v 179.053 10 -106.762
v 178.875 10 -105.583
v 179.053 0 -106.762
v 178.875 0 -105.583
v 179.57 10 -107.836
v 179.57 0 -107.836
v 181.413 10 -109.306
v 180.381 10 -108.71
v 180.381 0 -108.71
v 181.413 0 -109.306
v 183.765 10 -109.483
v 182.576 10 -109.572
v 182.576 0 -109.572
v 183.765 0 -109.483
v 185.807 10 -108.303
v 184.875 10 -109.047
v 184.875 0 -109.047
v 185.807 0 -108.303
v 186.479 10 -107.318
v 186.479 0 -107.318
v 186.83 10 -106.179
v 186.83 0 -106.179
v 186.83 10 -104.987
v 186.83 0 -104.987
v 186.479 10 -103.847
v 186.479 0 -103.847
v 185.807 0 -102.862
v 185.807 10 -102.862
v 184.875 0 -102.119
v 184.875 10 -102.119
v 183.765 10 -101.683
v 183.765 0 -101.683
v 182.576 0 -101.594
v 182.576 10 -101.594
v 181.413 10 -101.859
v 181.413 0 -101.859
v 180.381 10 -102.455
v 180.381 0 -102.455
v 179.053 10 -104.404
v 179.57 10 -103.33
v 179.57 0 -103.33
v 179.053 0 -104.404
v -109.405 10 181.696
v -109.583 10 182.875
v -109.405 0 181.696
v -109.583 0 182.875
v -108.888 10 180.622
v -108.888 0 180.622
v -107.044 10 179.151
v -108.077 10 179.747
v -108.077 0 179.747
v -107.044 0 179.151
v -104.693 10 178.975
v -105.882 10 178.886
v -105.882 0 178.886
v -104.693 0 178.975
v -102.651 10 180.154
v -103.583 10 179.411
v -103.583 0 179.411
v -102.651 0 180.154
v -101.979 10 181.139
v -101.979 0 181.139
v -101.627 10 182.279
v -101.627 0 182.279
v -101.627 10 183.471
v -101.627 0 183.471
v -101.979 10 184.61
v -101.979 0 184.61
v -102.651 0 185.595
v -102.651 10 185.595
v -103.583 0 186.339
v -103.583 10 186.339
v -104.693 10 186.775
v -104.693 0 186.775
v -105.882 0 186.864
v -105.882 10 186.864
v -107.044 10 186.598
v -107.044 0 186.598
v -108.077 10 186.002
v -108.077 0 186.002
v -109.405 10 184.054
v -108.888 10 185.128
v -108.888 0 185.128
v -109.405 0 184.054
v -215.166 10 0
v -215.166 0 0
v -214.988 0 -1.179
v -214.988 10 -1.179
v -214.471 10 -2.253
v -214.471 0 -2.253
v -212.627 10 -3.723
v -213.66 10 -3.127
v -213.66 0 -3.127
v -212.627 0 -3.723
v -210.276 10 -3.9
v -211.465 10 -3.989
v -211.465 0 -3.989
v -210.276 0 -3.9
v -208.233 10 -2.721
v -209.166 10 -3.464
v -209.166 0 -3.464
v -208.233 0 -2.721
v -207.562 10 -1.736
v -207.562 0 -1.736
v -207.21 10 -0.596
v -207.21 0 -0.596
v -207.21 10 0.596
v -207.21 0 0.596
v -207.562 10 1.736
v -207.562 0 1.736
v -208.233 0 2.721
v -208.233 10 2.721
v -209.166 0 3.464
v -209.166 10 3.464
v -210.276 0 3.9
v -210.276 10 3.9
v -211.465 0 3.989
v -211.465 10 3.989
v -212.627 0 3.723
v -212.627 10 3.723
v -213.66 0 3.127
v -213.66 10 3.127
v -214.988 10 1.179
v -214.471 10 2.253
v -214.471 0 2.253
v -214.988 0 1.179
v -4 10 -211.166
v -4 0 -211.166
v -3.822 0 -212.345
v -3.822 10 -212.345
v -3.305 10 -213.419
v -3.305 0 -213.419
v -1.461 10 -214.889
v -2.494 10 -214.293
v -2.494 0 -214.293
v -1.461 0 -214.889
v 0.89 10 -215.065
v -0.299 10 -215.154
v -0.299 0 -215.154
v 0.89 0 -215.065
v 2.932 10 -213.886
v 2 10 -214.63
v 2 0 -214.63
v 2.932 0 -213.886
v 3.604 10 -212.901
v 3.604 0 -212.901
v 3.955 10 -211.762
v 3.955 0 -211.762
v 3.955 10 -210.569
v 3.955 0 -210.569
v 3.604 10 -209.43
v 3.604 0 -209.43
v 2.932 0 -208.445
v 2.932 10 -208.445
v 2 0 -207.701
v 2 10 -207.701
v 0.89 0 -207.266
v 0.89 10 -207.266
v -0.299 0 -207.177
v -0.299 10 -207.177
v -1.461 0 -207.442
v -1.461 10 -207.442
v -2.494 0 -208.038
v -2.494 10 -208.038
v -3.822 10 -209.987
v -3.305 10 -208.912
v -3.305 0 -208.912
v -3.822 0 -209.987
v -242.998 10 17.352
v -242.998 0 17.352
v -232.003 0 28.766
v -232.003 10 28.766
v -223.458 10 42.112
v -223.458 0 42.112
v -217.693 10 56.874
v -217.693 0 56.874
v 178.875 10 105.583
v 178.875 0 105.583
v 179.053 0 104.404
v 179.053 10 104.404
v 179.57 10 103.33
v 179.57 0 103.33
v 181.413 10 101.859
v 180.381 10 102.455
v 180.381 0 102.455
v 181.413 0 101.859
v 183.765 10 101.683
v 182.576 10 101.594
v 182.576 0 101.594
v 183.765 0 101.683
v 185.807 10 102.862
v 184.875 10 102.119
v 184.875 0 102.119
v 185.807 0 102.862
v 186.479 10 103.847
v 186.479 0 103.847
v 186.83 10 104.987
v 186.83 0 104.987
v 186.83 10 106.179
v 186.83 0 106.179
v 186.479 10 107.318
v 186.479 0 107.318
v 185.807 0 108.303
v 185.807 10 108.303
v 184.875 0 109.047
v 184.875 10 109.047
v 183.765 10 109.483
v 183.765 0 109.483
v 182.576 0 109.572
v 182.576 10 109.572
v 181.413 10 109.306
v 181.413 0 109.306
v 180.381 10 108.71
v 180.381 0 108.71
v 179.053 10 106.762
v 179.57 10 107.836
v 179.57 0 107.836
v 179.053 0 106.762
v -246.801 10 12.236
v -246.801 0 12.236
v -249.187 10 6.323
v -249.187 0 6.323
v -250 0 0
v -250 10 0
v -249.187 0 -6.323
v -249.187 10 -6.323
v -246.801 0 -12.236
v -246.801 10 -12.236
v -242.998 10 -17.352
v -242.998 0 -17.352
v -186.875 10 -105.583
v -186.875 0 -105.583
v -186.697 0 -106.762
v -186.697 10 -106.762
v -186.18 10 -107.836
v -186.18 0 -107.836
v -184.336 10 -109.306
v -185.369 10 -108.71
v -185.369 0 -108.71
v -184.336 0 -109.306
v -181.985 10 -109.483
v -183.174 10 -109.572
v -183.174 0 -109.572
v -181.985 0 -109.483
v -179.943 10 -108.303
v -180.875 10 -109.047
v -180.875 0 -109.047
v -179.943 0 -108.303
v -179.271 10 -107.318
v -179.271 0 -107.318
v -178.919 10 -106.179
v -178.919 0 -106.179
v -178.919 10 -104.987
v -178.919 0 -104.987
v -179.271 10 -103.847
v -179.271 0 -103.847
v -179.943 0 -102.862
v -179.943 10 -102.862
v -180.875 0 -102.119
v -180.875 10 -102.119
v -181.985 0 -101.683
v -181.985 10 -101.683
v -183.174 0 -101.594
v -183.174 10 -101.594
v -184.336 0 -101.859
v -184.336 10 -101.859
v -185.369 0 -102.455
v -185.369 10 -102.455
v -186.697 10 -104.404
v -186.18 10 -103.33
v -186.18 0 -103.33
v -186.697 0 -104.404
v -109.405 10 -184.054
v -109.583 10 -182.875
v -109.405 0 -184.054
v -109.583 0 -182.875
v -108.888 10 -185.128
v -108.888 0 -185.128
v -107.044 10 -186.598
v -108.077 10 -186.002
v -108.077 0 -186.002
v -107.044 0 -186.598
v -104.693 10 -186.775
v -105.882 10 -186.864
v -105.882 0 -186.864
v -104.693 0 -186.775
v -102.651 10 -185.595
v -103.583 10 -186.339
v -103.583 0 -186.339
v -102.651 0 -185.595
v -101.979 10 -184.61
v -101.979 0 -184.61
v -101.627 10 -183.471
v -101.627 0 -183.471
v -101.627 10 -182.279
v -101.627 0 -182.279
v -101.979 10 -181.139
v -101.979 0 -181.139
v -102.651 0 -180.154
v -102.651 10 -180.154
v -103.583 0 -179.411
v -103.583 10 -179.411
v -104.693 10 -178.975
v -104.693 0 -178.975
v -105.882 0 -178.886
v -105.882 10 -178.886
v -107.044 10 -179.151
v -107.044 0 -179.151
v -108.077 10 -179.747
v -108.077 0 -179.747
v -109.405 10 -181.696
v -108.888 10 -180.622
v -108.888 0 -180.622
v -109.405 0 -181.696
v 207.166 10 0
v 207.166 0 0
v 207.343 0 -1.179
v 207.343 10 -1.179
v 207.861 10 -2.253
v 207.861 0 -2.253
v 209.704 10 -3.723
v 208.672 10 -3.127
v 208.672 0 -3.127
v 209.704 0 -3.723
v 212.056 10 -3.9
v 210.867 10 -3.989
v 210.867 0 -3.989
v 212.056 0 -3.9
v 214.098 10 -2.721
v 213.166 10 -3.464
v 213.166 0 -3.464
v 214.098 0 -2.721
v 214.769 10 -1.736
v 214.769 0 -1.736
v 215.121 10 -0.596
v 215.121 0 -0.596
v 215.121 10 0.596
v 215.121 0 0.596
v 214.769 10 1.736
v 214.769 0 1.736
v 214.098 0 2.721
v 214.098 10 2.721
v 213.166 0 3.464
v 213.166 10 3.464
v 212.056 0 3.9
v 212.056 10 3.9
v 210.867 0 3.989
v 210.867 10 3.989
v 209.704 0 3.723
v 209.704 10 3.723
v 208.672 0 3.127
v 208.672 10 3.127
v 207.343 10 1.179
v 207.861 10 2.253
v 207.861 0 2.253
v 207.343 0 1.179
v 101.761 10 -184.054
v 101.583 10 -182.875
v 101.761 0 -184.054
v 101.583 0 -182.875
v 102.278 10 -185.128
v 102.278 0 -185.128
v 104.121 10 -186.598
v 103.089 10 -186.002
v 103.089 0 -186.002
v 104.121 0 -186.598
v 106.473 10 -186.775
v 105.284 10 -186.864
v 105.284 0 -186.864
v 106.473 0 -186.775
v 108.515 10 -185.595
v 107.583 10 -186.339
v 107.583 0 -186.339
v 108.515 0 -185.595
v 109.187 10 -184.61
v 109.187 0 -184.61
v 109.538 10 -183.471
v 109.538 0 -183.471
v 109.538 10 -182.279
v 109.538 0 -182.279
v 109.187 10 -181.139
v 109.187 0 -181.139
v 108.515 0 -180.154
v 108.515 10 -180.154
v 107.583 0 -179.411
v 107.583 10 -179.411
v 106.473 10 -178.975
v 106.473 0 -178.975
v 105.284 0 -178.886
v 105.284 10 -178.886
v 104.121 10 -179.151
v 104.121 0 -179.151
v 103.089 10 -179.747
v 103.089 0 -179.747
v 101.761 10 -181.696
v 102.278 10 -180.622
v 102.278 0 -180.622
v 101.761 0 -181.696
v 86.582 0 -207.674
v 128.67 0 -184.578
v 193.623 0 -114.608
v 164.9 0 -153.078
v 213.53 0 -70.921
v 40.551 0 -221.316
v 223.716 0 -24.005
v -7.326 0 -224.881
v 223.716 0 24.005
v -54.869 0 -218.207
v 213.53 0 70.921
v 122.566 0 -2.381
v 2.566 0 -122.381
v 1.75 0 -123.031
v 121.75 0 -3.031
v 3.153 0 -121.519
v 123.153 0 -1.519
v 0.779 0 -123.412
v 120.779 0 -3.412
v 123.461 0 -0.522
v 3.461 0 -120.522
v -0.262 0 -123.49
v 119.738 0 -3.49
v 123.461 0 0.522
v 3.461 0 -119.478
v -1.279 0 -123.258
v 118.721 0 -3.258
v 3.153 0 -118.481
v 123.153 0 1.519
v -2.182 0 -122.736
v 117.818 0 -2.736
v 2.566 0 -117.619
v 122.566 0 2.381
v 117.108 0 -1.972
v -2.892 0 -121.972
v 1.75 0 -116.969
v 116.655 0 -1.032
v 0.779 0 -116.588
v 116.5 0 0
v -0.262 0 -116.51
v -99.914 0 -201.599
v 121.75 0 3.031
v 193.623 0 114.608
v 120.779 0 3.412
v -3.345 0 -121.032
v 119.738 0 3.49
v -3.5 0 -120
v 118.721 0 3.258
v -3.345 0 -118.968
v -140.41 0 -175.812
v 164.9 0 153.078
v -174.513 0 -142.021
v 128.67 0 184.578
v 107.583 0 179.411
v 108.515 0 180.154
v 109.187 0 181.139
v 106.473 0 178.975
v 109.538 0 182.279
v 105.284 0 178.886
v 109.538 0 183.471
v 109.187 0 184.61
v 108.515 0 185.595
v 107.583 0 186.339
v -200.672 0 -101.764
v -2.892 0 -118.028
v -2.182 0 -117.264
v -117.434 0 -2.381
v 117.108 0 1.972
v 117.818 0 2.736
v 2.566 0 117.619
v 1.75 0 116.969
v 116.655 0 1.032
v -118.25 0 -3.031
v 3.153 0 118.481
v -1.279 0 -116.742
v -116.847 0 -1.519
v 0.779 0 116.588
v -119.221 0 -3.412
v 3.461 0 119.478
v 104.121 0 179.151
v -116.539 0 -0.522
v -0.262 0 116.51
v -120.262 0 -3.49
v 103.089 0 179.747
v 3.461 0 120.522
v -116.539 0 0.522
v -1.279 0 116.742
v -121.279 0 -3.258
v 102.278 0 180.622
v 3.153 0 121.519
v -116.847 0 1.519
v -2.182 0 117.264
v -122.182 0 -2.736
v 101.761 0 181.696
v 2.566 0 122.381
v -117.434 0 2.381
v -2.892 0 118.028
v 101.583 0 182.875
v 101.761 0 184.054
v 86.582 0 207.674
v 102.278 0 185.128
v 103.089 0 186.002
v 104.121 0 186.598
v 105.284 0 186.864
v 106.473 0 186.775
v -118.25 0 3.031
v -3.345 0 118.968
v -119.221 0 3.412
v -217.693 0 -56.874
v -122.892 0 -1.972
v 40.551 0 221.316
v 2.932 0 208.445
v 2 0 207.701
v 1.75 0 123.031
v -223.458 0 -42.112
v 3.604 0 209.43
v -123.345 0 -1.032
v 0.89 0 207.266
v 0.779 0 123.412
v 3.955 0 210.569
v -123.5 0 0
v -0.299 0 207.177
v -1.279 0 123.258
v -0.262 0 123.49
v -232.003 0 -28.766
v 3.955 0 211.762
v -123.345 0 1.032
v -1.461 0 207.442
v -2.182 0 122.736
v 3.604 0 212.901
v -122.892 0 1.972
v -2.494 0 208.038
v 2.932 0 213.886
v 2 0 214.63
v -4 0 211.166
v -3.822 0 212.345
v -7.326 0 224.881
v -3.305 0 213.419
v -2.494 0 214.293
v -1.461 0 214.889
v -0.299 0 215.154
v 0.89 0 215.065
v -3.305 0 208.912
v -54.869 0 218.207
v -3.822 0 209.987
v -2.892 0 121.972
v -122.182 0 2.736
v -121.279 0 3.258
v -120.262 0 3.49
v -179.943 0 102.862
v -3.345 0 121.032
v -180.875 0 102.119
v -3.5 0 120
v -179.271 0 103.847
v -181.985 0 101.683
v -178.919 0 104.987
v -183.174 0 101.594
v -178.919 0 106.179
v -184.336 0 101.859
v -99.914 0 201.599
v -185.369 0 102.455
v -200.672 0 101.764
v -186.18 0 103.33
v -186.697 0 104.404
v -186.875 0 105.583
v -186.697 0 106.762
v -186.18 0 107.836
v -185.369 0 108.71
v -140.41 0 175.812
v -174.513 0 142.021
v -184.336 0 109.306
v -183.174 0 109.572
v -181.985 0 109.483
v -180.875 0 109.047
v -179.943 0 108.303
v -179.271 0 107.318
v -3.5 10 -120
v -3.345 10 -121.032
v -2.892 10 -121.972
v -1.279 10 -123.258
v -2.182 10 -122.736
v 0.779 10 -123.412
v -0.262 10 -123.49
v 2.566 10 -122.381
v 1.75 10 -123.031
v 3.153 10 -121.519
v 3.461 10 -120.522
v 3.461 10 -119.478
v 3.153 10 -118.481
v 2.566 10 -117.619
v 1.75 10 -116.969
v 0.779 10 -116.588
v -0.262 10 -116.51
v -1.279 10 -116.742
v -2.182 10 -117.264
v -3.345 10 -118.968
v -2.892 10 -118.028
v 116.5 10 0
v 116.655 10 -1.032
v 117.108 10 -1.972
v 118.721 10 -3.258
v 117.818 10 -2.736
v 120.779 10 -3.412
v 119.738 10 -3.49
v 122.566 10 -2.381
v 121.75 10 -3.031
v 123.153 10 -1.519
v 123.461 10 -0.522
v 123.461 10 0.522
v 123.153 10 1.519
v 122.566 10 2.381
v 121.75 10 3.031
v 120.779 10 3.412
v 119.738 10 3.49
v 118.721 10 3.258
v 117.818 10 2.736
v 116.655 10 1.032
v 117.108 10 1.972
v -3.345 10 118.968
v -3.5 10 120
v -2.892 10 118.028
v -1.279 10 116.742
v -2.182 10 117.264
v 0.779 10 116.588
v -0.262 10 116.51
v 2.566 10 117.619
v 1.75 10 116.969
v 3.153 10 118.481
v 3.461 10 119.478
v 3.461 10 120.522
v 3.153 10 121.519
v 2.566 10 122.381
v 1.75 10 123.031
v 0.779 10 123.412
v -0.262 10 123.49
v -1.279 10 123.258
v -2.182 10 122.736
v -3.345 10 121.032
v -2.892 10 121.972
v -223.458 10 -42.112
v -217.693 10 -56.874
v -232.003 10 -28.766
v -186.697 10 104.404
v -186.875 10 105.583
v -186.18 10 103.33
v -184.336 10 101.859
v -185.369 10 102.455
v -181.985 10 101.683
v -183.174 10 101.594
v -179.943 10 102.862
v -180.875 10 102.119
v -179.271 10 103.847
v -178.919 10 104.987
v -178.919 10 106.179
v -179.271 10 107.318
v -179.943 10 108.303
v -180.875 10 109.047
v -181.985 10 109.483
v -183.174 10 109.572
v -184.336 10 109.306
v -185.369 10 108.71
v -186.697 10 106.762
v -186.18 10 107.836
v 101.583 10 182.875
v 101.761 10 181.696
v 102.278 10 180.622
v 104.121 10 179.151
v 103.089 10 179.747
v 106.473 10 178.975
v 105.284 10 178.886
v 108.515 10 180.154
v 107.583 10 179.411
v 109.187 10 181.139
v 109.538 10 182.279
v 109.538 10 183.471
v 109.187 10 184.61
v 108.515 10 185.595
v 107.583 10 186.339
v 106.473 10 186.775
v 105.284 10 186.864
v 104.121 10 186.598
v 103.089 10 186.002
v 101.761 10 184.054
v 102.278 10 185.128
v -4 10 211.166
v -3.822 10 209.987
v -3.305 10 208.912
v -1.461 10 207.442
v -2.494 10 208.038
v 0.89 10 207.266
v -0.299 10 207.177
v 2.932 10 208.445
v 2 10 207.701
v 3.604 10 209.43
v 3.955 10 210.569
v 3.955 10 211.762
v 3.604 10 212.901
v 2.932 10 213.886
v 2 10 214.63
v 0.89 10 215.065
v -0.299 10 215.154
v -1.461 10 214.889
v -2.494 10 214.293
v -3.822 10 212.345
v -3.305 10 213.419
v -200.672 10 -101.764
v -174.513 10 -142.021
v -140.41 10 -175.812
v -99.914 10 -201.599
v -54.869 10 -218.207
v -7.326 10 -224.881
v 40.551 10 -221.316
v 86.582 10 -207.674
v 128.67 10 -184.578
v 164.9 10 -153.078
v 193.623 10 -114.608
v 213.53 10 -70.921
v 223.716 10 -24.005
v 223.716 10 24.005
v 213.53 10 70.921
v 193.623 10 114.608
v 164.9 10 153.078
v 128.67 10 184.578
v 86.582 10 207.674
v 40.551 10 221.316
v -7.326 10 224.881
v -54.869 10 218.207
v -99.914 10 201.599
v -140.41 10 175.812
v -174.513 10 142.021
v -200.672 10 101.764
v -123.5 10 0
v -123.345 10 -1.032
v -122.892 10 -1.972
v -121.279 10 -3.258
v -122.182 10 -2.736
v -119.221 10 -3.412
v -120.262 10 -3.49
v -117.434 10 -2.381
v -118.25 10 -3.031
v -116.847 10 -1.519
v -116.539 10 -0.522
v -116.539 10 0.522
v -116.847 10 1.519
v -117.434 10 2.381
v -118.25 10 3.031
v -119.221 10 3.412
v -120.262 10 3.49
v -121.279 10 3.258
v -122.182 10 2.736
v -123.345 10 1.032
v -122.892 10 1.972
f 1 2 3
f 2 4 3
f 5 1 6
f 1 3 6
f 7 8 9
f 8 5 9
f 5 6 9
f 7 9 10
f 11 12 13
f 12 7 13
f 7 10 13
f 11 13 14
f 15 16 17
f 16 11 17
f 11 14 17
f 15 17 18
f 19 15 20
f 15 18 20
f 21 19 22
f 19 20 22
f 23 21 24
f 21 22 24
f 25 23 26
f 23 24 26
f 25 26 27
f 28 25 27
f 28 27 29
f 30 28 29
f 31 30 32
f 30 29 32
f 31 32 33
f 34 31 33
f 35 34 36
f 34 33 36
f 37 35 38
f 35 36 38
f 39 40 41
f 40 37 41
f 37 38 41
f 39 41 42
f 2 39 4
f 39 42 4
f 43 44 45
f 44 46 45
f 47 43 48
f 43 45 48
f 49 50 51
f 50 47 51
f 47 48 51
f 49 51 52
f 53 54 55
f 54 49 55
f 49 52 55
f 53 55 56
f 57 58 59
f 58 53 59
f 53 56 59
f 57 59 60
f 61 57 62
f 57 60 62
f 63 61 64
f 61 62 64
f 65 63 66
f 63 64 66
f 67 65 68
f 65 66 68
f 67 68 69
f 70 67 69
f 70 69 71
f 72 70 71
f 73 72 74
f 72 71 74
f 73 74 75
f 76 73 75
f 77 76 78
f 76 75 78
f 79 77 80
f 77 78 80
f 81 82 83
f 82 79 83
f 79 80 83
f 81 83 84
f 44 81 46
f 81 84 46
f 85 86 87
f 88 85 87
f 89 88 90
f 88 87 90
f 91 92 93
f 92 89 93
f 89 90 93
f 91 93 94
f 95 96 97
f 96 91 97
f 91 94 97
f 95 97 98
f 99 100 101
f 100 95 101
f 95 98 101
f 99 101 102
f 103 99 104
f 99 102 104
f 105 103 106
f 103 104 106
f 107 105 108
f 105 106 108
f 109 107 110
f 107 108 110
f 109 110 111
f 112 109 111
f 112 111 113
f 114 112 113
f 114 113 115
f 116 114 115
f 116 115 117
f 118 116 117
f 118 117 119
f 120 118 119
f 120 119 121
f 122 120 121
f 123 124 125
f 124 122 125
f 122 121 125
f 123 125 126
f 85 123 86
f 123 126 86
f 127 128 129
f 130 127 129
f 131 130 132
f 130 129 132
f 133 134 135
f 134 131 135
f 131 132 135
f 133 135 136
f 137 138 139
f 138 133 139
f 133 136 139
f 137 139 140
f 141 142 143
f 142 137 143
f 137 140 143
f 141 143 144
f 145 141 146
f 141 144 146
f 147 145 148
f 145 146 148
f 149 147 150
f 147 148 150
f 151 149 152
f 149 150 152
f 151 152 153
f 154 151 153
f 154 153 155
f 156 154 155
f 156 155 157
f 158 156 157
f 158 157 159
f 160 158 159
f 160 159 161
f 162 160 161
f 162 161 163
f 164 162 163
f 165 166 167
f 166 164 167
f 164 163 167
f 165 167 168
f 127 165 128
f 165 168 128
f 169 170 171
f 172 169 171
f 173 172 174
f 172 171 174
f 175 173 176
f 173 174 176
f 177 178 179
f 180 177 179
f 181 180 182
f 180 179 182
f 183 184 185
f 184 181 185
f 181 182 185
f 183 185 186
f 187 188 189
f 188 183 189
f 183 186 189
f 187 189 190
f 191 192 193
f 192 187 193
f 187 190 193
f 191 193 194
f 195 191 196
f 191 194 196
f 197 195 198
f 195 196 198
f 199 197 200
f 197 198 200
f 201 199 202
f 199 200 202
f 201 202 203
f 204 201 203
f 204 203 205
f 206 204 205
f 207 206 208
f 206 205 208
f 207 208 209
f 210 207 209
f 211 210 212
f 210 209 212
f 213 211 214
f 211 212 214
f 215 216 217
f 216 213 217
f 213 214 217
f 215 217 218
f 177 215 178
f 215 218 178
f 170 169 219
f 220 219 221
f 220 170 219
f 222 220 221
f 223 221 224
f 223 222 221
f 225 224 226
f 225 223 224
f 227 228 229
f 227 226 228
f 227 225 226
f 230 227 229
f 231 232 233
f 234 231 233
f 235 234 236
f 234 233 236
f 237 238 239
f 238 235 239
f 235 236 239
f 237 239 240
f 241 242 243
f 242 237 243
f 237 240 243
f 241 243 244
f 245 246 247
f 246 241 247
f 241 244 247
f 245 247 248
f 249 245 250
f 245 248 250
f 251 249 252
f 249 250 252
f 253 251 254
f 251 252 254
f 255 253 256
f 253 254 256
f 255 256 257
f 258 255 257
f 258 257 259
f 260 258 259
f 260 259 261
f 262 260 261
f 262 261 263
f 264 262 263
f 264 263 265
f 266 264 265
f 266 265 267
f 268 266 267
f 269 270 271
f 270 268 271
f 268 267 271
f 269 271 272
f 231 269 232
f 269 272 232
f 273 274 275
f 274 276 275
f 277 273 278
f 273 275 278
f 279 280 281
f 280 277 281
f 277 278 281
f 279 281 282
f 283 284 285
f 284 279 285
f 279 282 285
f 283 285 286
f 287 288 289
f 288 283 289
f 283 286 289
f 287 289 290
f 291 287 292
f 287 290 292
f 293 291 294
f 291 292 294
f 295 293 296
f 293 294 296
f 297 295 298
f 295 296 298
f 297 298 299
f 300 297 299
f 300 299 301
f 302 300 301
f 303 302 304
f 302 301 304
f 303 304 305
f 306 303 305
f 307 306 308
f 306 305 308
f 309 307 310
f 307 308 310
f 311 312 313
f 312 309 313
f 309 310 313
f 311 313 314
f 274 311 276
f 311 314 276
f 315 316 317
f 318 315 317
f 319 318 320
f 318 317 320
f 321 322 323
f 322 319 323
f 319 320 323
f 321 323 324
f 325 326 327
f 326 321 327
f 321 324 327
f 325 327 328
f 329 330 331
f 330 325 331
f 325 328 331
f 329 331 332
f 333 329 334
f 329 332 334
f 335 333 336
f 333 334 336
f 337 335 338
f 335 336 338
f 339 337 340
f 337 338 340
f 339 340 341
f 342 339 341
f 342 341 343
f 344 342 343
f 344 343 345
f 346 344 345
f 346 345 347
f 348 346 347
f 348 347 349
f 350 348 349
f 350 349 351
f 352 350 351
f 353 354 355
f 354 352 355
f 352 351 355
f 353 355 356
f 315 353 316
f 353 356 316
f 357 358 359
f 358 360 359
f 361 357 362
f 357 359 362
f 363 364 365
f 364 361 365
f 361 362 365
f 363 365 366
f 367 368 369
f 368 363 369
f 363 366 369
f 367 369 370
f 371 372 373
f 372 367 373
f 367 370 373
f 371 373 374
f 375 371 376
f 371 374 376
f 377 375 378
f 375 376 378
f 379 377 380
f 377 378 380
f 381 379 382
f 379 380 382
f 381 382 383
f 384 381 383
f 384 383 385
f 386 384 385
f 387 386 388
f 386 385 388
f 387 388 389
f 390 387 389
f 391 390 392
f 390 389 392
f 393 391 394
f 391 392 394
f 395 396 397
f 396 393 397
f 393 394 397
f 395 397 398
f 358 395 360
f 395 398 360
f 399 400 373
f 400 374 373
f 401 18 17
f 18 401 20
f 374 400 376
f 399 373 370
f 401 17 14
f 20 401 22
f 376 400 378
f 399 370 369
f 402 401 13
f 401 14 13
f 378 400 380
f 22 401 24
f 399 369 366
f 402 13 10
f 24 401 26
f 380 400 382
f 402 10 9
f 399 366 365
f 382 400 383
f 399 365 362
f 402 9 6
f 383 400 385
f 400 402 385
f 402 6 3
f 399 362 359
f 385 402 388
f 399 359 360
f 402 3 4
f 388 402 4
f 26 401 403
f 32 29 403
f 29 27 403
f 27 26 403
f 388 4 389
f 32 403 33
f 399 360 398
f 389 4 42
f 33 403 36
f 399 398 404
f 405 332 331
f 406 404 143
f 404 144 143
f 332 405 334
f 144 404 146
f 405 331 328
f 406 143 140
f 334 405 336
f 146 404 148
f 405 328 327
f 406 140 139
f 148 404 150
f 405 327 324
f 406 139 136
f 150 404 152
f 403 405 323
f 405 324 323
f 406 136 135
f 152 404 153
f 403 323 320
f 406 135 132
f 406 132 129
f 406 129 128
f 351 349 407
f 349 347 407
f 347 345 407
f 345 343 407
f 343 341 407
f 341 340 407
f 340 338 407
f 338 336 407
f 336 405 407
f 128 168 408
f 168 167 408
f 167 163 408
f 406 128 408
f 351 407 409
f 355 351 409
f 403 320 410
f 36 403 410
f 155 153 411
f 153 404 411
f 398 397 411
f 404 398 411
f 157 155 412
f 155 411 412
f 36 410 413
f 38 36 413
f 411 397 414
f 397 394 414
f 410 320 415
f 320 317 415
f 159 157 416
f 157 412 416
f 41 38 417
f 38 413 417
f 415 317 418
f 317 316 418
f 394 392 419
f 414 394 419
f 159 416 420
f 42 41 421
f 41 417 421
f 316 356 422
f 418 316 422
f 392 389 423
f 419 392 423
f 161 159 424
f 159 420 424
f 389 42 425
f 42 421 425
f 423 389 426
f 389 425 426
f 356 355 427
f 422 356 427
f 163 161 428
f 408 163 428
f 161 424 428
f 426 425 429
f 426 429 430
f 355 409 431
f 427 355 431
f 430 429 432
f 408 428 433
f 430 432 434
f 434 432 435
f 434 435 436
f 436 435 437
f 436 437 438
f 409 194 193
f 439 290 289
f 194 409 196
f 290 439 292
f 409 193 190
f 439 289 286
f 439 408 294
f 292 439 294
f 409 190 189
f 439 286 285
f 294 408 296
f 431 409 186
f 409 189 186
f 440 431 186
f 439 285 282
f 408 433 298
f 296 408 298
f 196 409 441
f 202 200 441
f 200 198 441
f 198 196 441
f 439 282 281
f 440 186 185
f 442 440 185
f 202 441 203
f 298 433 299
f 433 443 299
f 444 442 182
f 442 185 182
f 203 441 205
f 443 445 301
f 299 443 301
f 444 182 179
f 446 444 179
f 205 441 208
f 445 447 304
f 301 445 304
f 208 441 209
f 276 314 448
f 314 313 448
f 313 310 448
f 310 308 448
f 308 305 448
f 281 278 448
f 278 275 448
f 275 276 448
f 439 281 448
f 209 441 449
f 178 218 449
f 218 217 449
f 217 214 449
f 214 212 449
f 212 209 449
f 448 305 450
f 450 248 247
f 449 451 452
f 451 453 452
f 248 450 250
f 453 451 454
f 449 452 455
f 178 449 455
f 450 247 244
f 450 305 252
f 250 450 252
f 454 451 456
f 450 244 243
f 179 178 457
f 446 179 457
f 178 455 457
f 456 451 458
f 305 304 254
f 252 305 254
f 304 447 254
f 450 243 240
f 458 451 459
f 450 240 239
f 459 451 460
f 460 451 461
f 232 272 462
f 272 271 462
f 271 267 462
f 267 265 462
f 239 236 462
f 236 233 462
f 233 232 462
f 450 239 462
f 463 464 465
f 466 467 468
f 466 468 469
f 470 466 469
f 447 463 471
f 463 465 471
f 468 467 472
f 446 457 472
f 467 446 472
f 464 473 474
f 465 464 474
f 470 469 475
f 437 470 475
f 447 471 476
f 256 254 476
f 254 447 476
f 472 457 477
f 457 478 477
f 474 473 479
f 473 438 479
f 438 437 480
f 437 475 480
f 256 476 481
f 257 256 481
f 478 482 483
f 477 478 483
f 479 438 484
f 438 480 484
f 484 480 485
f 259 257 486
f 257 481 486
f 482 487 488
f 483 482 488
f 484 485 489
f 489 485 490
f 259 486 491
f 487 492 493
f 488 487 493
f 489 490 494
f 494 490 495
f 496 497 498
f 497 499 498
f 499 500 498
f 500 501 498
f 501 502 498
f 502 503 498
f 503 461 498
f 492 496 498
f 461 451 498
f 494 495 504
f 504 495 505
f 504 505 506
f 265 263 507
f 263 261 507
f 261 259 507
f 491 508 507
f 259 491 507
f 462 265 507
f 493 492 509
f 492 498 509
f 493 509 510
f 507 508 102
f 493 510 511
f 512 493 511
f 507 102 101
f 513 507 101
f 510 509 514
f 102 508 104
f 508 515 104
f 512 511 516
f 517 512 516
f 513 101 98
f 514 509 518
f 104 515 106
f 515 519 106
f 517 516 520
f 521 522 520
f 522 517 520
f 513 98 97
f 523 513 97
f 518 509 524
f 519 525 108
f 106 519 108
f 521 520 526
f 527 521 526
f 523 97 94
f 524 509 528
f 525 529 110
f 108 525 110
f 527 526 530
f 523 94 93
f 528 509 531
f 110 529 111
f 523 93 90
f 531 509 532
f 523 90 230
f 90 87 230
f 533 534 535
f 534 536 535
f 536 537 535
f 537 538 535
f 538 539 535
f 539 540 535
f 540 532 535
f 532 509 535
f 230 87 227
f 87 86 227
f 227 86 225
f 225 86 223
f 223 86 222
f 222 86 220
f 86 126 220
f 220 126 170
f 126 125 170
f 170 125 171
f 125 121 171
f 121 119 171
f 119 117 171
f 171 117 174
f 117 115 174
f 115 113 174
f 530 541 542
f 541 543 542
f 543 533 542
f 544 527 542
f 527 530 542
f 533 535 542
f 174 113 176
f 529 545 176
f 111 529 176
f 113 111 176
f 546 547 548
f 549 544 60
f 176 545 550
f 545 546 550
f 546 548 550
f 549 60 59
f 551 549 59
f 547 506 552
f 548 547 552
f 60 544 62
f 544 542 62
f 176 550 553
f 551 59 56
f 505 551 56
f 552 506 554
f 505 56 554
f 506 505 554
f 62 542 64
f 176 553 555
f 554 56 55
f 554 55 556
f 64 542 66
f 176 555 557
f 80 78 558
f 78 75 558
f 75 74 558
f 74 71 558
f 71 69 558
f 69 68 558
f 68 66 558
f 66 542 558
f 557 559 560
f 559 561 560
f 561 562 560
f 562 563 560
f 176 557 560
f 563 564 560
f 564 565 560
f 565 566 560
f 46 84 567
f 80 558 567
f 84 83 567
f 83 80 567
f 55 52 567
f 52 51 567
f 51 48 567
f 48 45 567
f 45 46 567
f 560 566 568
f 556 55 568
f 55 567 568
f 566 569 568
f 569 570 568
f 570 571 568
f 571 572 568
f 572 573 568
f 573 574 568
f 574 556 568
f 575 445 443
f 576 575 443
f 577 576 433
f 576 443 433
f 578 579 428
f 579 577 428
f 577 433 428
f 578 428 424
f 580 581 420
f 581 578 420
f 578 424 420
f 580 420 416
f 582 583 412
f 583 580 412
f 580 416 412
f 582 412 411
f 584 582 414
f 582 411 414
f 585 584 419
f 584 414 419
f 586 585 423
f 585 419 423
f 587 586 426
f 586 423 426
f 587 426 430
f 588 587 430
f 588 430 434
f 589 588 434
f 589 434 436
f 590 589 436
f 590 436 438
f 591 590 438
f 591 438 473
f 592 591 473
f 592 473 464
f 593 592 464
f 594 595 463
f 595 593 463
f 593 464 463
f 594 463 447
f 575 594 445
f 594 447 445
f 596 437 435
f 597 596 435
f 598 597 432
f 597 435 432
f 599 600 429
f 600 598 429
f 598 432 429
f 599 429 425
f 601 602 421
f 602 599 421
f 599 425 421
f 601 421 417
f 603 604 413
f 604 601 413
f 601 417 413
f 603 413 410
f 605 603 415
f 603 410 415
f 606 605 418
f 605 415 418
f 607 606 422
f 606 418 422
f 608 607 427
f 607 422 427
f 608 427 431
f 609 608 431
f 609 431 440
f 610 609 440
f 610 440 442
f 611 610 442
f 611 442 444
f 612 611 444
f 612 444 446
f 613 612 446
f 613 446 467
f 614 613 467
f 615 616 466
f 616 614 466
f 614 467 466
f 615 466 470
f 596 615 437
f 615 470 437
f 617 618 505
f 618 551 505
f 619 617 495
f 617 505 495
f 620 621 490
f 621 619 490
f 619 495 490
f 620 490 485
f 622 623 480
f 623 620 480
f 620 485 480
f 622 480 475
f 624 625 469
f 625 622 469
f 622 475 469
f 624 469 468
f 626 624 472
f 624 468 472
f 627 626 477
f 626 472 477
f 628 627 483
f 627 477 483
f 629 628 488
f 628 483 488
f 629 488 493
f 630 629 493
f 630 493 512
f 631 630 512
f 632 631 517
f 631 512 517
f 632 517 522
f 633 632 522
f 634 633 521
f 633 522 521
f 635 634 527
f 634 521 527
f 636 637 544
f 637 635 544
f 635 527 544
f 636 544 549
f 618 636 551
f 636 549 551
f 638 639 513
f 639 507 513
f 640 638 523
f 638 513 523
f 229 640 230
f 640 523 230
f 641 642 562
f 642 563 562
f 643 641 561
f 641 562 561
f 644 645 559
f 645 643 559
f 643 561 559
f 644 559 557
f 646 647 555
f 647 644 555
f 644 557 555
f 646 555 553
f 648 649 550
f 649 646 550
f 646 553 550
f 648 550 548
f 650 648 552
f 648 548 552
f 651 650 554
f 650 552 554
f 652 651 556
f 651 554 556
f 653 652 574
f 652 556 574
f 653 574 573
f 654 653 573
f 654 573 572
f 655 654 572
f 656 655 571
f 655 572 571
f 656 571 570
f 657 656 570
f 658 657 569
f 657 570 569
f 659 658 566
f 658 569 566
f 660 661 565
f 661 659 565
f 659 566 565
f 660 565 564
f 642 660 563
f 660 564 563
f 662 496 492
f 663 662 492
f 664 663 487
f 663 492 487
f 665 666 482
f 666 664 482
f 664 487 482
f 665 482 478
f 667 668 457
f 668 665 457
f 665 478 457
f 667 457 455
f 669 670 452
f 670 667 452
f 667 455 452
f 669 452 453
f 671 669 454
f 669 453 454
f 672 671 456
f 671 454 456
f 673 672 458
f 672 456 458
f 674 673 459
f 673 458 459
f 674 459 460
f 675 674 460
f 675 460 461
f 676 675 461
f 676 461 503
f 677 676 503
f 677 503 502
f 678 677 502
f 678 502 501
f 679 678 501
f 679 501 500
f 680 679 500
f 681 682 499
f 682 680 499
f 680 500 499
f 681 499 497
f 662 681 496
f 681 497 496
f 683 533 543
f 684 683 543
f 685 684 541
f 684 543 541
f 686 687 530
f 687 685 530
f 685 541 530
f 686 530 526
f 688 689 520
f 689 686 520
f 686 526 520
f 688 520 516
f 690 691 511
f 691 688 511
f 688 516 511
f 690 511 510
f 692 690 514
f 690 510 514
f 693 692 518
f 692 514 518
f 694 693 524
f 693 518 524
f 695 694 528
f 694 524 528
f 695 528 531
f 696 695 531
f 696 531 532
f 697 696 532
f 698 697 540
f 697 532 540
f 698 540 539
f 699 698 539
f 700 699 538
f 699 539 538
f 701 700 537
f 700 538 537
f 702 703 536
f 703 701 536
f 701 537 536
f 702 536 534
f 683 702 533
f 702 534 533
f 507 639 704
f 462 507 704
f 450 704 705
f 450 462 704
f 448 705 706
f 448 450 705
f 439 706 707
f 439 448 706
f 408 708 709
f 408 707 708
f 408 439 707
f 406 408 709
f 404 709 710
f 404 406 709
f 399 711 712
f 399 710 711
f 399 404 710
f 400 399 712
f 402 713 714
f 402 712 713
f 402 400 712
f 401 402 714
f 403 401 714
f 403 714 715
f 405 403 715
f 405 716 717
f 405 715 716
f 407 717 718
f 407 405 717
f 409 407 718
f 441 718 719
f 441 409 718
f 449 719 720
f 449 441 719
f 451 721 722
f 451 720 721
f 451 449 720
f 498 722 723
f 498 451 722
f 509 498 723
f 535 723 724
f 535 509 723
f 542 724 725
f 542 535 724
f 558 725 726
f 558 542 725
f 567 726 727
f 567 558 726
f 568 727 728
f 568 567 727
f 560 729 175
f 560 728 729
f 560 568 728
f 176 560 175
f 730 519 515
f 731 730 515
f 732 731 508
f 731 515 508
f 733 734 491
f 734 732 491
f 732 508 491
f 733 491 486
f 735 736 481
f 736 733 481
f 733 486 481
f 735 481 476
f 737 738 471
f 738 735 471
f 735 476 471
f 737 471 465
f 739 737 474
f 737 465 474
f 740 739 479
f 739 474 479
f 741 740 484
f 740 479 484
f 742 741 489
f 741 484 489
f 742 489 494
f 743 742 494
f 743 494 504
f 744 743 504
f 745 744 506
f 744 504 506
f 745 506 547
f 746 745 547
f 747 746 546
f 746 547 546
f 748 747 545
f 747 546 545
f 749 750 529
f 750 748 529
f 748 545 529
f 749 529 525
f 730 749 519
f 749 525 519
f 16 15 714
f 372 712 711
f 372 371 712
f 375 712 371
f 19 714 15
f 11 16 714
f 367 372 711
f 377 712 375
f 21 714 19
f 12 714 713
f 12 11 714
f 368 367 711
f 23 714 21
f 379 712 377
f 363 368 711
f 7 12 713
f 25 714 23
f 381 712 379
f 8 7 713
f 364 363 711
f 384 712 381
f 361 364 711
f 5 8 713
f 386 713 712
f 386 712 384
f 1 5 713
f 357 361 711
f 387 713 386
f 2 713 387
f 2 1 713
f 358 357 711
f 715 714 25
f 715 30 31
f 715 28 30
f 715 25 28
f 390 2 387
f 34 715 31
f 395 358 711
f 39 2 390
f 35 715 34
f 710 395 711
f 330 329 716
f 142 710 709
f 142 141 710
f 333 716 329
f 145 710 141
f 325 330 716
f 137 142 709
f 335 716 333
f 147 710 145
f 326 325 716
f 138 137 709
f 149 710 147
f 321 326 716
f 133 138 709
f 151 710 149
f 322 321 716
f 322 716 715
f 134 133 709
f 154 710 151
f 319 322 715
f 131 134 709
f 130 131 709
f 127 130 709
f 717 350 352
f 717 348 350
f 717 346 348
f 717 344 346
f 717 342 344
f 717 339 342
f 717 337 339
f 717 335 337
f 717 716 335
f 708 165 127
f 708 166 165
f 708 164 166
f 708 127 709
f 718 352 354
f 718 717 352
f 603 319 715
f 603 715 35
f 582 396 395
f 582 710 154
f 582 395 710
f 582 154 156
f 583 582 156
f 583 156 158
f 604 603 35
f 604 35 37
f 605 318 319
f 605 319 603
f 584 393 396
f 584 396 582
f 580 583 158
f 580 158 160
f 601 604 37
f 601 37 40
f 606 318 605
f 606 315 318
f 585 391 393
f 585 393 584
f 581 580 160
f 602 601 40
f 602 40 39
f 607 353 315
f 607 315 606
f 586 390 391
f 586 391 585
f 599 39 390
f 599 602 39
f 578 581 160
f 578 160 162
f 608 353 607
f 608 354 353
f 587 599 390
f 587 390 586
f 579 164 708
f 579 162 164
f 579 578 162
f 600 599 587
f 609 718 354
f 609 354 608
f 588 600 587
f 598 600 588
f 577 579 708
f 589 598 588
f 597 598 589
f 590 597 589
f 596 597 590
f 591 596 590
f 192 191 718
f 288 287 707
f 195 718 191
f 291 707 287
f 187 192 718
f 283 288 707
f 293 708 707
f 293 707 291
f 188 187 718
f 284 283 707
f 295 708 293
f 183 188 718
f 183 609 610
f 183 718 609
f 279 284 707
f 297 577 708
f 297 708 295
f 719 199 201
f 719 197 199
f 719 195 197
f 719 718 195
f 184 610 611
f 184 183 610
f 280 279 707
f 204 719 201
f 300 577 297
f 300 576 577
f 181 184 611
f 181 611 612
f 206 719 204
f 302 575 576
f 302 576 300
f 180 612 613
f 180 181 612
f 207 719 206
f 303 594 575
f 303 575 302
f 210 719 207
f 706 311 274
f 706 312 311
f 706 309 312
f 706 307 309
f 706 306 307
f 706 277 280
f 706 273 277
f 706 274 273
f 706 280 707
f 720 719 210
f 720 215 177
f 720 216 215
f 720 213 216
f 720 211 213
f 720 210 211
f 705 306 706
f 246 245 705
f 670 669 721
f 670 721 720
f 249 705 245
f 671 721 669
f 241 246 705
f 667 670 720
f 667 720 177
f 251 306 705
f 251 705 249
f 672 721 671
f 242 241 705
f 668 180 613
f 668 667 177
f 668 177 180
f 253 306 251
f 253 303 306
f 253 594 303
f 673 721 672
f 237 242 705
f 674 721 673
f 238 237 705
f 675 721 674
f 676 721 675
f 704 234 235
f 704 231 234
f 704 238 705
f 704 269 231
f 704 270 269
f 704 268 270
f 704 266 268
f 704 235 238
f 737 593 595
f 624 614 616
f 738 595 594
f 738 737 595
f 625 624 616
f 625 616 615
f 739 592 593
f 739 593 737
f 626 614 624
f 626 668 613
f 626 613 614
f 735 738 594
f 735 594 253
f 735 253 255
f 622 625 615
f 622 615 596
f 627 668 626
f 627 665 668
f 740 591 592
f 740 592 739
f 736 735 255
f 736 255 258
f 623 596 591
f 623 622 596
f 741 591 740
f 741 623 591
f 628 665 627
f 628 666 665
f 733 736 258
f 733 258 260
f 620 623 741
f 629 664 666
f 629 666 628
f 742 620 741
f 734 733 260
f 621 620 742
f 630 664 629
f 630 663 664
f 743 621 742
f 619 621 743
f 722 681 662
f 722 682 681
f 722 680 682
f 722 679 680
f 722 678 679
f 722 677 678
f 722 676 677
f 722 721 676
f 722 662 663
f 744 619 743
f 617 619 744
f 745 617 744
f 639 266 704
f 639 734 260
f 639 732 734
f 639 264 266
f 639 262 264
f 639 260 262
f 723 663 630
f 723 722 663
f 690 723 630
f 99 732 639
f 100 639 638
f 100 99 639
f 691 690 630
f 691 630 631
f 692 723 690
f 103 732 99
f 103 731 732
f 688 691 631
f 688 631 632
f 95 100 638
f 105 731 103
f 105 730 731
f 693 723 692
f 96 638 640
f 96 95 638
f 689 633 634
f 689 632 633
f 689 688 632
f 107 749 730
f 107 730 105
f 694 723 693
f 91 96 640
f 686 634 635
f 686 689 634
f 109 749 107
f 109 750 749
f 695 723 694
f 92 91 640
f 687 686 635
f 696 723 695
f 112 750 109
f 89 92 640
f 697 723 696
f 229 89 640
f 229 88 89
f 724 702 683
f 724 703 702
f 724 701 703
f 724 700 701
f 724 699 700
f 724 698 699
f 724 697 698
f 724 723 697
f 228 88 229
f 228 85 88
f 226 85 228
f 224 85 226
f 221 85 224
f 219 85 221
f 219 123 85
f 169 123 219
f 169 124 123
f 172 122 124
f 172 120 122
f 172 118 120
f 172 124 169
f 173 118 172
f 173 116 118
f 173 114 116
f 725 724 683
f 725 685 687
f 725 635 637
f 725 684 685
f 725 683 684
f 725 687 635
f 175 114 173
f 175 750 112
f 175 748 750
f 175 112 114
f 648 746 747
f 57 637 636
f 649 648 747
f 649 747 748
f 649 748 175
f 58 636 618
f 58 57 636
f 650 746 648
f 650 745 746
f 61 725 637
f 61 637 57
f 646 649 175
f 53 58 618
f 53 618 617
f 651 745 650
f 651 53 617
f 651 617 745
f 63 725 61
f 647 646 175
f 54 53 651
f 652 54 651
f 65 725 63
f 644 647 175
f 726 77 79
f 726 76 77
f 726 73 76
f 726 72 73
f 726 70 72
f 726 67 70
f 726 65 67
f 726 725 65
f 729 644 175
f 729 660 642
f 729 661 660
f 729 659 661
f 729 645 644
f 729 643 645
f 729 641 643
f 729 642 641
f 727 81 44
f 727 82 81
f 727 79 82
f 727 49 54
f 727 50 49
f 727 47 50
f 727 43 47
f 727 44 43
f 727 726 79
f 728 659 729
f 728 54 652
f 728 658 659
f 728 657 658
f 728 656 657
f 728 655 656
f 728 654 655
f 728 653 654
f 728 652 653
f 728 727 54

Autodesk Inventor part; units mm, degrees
ref_plane "YZ Plane" through (0, 0, 0) normal (1, 0, 0) x (0, 1, 0)
ref_plane "XZ Plane" through (0, 0, 0) normal (0, 1, 0) x (-1, 0, 0)
ref_plane "XY Plane" through (0, 0, 0) normal (0, 0, 1) x (1, 0, 0)
sketch "Sketch1" plane through (0, 0, 0) normal (0, 1, 0) x (-1, 0, 0)
  arc A0 (-195.1682, -43.6963) -> (-195.1682, -43.6963) centre (0, 0) ccw construction
  spline S0 degree 3 poles (212.7614, 63.8524) (213.1534, 65.8524) (213.5259, 67.8561) (213.8787, 69.8633) knots 0 0 0 0 0.019635 0.019635 0.019635 0.019635 construction
  circle A1 centre (0, 0) radius 225
  line L0 (0, 0) -> (0, 120) construction
  line L1 (0, 0) -> (0, -120) construction
  line L2 (0, 0) -> (-120, 0) construction
  line L3 (0, 0) -> (120, 0) construction
  circle A2 centre (-120, 0) radius 3.5
  circle A3 centre (0, -120) radius 3.5
  circle A4 centre (120, 0) radius 3.5
  circle A5 centre (0, 120) radius 3.5
  circle A6 centre (0, -211.1656) radius 4
  circle A7 centre (105.5828, -182.8748) radius 4
  circle A8 centre (182.8748, -105.5828) radius 4
  circle A9 centre (211.1656, 0) radius 4
  circle A10 centre (182.8748, 105.5828) radius 4
  circle A11 centre (105.5828, 182.8748) radius 4
  circle A12 centre (0, 211.1656) radius 4
  circle A13 centre (-105.5828, 182.8748) radius 4
  circle A14 centre (-182.8748, 105.5828) radius 4
  circle A15 centre (-211.1656, 0) radius 4
  circle A16 centre (-182.8748, -105.5828) radius 4
  circle A17 centre (-105.5828, -182.8748) radius 4
  circle A18 centre (225, 0) radius 25
  line L4 (225, 0) -> (242.9975, 17.352)
  line L5 (225, 0) -> (250, 0)
  arc A19 (217.6933, 56.8737) -> (242.9975, 17.352) centre (295.1945, 78.633) ccw
  arc A20 (242.9975, -17.352) -> (217.6933, -56.8737) centre (295.1945, -78.633) ccw
  point P0 (217.6933, -56.8737)
  point P1 (242.9975, -17.352)
  dimension "d0" = 120
  dimension "d1" = 120
  dimension "d2" = 120
  dimension "d3" = 120
  dimension "d4" = 7
  dimension "d5" = 7
  dimension "d6" = 7
  dimension "d7" = 7
  dimension "d10" = 450
  dimension "d11" = 8
  dimension "d14" = 360
  dimension "d16" = 50
  dimension "d17" = 43.954
extrude "Extrusion1" add sketch "Sketch1" along normal blind 10 contours A1 A18 | A19 A18 A1 | A1 A18 A20 | A18 A19 L4 A1 | A1 A18 | A1 L5 A18 A20 | L4 A18 L5
properties part number "MDF Board"
